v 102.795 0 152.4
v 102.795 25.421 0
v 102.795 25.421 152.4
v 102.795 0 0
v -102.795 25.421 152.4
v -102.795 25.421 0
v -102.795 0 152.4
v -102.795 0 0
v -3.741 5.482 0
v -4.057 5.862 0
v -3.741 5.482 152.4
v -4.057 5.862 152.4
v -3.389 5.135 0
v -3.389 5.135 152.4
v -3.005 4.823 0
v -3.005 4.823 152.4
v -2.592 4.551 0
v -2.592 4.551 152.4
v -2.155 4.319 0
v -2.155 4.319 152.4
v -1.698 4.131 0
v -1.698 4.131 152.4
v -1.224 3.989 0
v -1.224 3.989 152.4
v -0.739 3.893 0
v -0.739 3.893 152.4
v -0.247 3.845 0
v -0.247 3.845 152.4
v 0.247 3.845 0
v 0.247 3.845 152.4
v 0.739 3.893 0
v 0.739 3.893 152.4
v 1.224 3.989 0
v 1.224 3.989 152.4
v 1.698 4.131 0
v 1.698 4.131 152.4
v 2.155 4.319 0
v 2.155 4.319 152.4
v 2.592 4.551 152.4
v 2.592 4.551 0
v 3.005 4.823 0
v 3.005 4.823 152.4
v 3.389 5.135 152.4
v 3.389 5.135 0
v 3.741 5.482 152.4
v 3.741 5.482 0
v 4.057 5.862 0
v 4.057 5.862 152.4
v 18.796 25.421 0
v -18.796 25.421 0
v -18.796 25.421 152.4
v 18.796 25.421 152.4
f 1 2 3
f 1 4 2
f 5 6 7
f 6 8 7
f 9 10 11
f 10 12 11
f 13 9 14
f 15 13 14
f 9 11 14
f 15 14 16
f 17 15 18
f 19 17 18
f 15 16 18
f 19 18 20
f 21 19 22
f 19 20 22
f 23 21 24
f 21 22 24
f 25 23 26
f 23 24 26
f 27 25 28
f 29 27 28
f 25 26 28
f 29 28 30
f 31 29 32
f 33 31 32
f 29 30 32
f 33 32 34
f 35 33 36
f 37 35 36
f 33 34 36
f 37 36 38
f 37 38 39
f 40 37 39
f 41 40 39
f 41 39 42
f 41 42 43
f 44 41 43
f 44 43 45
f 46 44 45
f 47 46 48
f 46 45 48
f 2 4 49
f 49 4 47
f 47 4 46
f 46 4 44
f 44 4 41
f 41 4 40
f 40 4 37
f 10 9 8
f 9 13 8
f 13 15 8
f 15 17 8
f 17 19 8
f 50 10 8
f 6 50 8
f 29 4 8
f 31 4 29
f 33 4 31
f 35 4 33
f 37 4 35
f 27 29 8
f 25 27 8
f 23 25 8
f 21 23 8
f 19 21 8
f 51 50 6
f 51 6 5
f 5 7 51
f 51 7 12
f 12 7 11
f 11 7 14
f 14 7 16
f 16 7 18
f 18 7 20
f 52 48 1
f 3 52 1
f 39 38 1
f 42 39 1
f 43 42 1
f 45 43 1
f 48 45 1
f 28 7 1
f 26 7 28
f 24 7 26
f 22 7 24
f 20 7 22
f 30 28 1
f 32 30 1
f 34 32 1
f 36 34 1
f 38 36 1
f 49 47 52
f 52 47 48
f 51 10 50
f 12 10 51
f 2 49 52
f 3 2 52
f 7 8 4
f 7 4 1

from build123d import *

# Parameters (mm, degrees)
F0_W     = 26.5945848078
F0_H     = 6.6253300756
F1_DEPTH = 152.4
F2_DEPTH = 76.2
F3_DEPTH = 18.796
F4_SIZE2 = 24.9431344672
F4_SIZE  = 18.796
F6_R     = 5.08


with BuildPart() as f1:
    # F0 (on Top) → F1 (new body)
    with BuildSketch(Plane.XY):
        with Locations((-13.2972924039, 3.3126650378)):
            Rectangle(F0_W, F0_H)
    extrude(amount=F1_DEPTH)

    # F2 (add): a face of the model
    f2_faces = [f1.faces().sort_by_distance(p)[0] for p in [
        (-26.5945848078, 3.3126650378, 76.2),
    ]]
    extrude(f2_faces, amount=F2_DEPTH)

    # F3 (add): a face of the model
    f3_faces = [f1.faces().sort_by_distance(p)[0] for p in [
        (-51.3972924039, 6.6253300756, 76.2),
    ]]
    extrude(f3_faces, amount=F3_DEPTH)

    # F4
    f4_edges = [f1.edges().sort_by_distance(p)[0] for p in [
        (0, 25.42133, 76.2),
    ]]
    f4_side = f1.faces().sort_by_distance((-51.397292, 25.42133, 76.2))[0]
    chamfer(f4_edges, length=F4_SIZE, length2=F4_SIZE2, reference=f4_side)

    # F5: F1 across plane


with BuildPart() as f1_1:
    add(f1.part)
    add(f1.part.mirror(Plane.YZ))

    # F6
    f6_edges = [f1_1.edges().sort_by_distance(p)[0] for p in [
        (0, 0.478196, 76.2),
    ]]
    fillet(f6_edges, radius=F6_R)


solid = f1_1.part
